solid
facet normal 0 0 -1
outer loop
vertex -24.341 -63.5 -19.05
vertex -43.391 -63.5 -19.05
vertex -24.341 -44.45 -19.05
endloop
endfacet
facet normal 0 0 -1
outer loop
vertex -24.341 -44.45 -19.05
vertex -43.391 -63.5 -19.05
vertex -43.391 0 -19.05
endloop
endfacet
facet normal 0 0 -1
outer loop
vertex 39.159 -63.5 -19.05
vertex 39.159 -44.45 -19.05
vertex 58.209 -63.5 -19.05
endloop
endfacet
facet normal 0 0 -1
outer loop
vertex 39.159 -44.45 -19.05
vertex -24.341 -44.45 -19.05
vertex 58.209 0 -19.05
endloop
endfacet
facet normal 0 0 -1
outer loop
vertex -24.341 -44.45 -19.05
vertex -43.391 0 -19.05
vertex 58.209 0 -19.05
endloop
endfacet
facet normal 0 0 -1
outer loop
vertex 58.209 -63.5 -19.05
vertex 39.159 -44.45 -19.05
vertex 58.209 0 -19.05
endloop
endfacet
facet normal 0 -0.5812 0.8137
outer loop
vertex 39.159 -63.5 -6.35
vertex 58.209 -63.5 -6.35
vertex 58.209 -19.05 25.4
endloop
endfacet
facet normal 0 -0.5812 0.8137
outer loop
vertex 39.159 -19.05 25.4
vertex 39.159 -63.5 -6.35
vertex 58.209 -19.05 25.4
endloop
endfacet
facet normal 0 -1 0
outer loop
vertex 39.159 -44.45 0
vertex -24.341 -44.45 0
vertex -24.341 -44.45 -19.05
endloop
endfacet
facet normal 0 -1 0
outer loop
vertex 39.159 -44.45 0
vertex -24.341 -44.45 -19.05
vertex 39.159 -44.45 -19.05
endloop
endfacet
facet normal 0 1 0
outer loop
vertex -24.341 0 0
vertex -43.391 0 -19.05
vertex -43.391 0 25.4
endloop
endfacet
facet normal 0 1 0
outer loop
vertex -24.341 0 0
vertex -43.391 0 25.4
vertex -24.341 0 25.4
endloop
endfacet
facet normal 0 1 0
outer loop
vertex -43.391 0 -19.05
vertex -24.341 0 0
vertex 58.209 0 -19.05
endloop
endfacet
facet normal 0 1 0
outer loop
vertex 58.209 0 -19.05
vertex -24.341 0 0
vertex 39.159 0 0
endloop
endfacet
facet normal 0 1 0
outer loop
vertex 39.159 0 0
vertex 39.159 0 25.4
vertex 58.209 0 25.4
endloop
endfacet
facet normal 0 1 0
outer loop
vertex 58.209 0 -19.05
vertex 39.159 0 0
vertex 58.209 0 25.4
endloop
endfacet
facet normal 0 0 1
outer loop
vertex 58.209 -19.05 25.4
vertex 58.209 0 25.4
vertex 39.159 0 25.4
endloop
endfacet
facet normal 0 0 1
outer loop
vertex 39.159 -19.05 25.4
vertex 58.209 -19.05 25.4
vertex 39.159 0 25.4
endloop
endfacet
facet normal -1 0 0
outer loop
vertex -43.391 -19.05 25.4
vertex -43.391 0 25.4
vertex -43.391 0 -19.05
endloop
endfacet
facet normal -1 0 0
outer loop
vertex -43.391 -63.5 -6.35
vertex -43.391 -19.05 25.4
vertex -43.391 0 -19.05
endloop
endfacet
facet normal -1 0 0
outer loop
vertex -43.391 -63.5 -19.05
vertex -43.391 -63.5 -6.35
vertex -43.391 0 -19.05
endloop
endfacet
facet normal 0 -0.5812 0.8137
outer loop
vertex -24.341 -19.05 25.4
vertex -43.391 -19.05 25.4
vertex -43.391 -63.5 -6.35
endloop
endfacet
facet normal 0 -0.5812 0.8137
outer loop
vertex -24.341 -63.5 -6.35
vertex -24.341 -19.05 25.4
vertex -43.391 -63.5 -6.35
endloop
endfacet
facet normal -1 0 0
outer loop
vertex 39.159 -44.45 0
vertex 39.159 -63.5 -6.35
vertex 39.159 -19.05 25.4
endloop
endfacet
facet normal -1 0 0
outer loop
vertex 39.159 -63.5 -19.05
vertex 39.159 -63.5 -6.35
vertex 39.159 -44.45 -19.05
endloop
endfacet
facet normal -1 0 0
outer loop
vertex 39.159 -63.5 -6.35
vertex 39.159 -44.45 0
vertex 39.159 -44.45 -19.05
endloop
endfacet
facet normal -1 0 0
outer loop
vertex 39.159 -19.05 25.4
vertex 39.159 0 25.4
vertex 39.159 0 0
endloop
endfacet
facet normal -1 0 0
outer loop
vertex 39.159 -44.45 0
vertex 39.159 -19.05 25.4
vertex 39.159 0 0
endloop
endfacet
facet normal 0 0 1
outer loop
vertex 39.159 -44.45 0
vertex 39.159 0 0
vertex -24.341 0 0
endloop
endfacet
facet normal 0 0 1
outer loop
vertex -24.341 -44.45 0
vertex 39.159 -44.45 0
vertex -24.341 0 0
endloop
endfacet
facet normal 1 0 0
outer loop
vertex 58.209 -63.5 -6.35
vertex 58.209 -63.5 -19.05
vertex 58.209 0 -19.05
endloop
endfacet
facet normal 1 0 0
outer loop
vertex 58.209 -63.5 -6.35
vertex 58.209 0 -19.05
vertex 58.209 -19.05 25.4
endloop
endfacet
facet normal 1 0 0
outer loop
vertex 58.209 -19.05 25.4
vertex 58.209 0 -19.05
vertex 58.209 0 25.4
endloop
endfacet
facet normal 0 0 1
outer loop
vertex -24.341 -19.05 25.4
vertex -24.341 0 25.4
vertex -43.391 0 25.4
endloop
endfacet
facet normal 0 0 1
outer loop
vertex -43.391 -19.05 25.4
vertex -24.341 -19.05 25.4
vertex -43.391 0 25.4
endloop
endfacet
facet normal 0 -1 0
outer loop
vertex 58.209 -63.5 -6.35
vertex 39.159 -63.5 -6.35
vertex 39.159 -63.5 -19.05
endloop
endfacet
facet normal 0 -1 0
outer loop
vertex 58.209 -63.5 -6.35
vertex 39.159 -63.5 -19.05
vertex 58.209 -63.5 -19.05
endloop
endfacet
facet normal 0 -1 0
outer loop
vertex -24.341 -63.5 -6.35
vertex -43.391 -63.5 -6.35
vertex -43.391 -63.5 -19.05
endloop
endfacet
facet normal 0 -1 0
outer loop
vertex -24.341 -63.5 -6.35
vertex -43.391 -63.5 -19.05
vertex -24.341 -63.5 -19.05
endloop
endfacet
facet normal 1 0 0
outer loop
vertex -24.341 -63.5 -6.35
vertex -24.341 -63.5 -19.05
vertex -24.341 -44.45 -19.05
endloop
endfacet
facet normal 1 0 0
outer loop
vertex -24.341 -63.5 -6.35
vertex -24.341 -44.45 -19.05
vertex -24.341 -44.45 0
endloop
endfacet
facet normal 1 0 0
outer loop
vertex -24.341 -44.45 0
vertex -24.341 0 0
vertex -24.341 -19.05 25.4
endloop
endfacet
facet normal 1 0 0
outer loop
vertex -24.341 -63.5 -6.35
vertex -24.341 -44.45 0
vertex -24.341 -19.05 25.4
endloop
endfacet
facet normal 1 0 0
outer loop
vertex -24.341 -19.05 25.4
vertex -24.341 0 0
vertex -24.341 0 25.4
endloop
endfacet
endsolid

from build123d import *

# Parameters (mm, degrees)
F0_W     = 19.050004
F0_H     = 12.7
F0_W_2   = 19.05
F1_DEPTH = 63.5
F3_W     = 63.5
F3_H     = 19.05
F4_DEPTH = 19.05
F5_DEPTH = 39.99707
F7_DEPTH = 47.63301


with BuildPart() as f1:
    # F0 (on Front) → F1 (new body)
    with BuildSketch(Plane.XZ):
        Polygon((-24.340652, 0), (-24.340652, 25.4), (-43.390656, 25.4), (-43.390656, -6.35), (-24.340652, -6.35), align=None)
        Polygon((39.159348, 0), (-24.340652, 0), (-24.340652, -6.35), (-24.340652, -19.05), (39.159348, -19.05), (39.159348, -6.35), align=None)
        with Locations((-33.865654, -12.7)):
            Rectangle(F0_W, F0_H)
        Polygon((39.159348, 25.4), (39.159348, 0), (39.159348, -6.35), (58.209348, -6.35), (58.209348, 25.4), align=None)
        with Locations((48.684348, -12.7)):
            Rectangle(F0_W_2, F0_H)
    extrude(amount=F1_DEPTH)

    # F3 (on face) → F4 (cut)
    with BuildSketch(Plane.XZ.offset(63.5)):
        with Locations((7.409348, -9.525)):
            Rectangle(F3_W, F3_H)
    extrude(amount=-F4_DEPTH, mode=Mode.SUBTRACT)

    # F2 (on face) → F5 (cut)
    with BuildSketch(Plane.YZ.offset(58.209348)):
        Polygon((-63.5, 25.4), (-63.5, -6.35), (-19.05, 25.4), align=None)
    extrude(amount=-F5_DEPTH, mode=Mode.SUBTRACT)

    # F6 (on face) → F7 (cut)
    with BuildSketch(Plane(origin=(-43.390656, 0, 0), x_dir=(0, -1, 0), z_dir=(-1, 0, 0))):
        Polygon((19.05, 25.4), (63.5, -6.35), (63.5, 25.4), align=None)
    extrude(amount=-F7_DEPTH, mode=Mode.SUBTRACT)


solid = f1.part
